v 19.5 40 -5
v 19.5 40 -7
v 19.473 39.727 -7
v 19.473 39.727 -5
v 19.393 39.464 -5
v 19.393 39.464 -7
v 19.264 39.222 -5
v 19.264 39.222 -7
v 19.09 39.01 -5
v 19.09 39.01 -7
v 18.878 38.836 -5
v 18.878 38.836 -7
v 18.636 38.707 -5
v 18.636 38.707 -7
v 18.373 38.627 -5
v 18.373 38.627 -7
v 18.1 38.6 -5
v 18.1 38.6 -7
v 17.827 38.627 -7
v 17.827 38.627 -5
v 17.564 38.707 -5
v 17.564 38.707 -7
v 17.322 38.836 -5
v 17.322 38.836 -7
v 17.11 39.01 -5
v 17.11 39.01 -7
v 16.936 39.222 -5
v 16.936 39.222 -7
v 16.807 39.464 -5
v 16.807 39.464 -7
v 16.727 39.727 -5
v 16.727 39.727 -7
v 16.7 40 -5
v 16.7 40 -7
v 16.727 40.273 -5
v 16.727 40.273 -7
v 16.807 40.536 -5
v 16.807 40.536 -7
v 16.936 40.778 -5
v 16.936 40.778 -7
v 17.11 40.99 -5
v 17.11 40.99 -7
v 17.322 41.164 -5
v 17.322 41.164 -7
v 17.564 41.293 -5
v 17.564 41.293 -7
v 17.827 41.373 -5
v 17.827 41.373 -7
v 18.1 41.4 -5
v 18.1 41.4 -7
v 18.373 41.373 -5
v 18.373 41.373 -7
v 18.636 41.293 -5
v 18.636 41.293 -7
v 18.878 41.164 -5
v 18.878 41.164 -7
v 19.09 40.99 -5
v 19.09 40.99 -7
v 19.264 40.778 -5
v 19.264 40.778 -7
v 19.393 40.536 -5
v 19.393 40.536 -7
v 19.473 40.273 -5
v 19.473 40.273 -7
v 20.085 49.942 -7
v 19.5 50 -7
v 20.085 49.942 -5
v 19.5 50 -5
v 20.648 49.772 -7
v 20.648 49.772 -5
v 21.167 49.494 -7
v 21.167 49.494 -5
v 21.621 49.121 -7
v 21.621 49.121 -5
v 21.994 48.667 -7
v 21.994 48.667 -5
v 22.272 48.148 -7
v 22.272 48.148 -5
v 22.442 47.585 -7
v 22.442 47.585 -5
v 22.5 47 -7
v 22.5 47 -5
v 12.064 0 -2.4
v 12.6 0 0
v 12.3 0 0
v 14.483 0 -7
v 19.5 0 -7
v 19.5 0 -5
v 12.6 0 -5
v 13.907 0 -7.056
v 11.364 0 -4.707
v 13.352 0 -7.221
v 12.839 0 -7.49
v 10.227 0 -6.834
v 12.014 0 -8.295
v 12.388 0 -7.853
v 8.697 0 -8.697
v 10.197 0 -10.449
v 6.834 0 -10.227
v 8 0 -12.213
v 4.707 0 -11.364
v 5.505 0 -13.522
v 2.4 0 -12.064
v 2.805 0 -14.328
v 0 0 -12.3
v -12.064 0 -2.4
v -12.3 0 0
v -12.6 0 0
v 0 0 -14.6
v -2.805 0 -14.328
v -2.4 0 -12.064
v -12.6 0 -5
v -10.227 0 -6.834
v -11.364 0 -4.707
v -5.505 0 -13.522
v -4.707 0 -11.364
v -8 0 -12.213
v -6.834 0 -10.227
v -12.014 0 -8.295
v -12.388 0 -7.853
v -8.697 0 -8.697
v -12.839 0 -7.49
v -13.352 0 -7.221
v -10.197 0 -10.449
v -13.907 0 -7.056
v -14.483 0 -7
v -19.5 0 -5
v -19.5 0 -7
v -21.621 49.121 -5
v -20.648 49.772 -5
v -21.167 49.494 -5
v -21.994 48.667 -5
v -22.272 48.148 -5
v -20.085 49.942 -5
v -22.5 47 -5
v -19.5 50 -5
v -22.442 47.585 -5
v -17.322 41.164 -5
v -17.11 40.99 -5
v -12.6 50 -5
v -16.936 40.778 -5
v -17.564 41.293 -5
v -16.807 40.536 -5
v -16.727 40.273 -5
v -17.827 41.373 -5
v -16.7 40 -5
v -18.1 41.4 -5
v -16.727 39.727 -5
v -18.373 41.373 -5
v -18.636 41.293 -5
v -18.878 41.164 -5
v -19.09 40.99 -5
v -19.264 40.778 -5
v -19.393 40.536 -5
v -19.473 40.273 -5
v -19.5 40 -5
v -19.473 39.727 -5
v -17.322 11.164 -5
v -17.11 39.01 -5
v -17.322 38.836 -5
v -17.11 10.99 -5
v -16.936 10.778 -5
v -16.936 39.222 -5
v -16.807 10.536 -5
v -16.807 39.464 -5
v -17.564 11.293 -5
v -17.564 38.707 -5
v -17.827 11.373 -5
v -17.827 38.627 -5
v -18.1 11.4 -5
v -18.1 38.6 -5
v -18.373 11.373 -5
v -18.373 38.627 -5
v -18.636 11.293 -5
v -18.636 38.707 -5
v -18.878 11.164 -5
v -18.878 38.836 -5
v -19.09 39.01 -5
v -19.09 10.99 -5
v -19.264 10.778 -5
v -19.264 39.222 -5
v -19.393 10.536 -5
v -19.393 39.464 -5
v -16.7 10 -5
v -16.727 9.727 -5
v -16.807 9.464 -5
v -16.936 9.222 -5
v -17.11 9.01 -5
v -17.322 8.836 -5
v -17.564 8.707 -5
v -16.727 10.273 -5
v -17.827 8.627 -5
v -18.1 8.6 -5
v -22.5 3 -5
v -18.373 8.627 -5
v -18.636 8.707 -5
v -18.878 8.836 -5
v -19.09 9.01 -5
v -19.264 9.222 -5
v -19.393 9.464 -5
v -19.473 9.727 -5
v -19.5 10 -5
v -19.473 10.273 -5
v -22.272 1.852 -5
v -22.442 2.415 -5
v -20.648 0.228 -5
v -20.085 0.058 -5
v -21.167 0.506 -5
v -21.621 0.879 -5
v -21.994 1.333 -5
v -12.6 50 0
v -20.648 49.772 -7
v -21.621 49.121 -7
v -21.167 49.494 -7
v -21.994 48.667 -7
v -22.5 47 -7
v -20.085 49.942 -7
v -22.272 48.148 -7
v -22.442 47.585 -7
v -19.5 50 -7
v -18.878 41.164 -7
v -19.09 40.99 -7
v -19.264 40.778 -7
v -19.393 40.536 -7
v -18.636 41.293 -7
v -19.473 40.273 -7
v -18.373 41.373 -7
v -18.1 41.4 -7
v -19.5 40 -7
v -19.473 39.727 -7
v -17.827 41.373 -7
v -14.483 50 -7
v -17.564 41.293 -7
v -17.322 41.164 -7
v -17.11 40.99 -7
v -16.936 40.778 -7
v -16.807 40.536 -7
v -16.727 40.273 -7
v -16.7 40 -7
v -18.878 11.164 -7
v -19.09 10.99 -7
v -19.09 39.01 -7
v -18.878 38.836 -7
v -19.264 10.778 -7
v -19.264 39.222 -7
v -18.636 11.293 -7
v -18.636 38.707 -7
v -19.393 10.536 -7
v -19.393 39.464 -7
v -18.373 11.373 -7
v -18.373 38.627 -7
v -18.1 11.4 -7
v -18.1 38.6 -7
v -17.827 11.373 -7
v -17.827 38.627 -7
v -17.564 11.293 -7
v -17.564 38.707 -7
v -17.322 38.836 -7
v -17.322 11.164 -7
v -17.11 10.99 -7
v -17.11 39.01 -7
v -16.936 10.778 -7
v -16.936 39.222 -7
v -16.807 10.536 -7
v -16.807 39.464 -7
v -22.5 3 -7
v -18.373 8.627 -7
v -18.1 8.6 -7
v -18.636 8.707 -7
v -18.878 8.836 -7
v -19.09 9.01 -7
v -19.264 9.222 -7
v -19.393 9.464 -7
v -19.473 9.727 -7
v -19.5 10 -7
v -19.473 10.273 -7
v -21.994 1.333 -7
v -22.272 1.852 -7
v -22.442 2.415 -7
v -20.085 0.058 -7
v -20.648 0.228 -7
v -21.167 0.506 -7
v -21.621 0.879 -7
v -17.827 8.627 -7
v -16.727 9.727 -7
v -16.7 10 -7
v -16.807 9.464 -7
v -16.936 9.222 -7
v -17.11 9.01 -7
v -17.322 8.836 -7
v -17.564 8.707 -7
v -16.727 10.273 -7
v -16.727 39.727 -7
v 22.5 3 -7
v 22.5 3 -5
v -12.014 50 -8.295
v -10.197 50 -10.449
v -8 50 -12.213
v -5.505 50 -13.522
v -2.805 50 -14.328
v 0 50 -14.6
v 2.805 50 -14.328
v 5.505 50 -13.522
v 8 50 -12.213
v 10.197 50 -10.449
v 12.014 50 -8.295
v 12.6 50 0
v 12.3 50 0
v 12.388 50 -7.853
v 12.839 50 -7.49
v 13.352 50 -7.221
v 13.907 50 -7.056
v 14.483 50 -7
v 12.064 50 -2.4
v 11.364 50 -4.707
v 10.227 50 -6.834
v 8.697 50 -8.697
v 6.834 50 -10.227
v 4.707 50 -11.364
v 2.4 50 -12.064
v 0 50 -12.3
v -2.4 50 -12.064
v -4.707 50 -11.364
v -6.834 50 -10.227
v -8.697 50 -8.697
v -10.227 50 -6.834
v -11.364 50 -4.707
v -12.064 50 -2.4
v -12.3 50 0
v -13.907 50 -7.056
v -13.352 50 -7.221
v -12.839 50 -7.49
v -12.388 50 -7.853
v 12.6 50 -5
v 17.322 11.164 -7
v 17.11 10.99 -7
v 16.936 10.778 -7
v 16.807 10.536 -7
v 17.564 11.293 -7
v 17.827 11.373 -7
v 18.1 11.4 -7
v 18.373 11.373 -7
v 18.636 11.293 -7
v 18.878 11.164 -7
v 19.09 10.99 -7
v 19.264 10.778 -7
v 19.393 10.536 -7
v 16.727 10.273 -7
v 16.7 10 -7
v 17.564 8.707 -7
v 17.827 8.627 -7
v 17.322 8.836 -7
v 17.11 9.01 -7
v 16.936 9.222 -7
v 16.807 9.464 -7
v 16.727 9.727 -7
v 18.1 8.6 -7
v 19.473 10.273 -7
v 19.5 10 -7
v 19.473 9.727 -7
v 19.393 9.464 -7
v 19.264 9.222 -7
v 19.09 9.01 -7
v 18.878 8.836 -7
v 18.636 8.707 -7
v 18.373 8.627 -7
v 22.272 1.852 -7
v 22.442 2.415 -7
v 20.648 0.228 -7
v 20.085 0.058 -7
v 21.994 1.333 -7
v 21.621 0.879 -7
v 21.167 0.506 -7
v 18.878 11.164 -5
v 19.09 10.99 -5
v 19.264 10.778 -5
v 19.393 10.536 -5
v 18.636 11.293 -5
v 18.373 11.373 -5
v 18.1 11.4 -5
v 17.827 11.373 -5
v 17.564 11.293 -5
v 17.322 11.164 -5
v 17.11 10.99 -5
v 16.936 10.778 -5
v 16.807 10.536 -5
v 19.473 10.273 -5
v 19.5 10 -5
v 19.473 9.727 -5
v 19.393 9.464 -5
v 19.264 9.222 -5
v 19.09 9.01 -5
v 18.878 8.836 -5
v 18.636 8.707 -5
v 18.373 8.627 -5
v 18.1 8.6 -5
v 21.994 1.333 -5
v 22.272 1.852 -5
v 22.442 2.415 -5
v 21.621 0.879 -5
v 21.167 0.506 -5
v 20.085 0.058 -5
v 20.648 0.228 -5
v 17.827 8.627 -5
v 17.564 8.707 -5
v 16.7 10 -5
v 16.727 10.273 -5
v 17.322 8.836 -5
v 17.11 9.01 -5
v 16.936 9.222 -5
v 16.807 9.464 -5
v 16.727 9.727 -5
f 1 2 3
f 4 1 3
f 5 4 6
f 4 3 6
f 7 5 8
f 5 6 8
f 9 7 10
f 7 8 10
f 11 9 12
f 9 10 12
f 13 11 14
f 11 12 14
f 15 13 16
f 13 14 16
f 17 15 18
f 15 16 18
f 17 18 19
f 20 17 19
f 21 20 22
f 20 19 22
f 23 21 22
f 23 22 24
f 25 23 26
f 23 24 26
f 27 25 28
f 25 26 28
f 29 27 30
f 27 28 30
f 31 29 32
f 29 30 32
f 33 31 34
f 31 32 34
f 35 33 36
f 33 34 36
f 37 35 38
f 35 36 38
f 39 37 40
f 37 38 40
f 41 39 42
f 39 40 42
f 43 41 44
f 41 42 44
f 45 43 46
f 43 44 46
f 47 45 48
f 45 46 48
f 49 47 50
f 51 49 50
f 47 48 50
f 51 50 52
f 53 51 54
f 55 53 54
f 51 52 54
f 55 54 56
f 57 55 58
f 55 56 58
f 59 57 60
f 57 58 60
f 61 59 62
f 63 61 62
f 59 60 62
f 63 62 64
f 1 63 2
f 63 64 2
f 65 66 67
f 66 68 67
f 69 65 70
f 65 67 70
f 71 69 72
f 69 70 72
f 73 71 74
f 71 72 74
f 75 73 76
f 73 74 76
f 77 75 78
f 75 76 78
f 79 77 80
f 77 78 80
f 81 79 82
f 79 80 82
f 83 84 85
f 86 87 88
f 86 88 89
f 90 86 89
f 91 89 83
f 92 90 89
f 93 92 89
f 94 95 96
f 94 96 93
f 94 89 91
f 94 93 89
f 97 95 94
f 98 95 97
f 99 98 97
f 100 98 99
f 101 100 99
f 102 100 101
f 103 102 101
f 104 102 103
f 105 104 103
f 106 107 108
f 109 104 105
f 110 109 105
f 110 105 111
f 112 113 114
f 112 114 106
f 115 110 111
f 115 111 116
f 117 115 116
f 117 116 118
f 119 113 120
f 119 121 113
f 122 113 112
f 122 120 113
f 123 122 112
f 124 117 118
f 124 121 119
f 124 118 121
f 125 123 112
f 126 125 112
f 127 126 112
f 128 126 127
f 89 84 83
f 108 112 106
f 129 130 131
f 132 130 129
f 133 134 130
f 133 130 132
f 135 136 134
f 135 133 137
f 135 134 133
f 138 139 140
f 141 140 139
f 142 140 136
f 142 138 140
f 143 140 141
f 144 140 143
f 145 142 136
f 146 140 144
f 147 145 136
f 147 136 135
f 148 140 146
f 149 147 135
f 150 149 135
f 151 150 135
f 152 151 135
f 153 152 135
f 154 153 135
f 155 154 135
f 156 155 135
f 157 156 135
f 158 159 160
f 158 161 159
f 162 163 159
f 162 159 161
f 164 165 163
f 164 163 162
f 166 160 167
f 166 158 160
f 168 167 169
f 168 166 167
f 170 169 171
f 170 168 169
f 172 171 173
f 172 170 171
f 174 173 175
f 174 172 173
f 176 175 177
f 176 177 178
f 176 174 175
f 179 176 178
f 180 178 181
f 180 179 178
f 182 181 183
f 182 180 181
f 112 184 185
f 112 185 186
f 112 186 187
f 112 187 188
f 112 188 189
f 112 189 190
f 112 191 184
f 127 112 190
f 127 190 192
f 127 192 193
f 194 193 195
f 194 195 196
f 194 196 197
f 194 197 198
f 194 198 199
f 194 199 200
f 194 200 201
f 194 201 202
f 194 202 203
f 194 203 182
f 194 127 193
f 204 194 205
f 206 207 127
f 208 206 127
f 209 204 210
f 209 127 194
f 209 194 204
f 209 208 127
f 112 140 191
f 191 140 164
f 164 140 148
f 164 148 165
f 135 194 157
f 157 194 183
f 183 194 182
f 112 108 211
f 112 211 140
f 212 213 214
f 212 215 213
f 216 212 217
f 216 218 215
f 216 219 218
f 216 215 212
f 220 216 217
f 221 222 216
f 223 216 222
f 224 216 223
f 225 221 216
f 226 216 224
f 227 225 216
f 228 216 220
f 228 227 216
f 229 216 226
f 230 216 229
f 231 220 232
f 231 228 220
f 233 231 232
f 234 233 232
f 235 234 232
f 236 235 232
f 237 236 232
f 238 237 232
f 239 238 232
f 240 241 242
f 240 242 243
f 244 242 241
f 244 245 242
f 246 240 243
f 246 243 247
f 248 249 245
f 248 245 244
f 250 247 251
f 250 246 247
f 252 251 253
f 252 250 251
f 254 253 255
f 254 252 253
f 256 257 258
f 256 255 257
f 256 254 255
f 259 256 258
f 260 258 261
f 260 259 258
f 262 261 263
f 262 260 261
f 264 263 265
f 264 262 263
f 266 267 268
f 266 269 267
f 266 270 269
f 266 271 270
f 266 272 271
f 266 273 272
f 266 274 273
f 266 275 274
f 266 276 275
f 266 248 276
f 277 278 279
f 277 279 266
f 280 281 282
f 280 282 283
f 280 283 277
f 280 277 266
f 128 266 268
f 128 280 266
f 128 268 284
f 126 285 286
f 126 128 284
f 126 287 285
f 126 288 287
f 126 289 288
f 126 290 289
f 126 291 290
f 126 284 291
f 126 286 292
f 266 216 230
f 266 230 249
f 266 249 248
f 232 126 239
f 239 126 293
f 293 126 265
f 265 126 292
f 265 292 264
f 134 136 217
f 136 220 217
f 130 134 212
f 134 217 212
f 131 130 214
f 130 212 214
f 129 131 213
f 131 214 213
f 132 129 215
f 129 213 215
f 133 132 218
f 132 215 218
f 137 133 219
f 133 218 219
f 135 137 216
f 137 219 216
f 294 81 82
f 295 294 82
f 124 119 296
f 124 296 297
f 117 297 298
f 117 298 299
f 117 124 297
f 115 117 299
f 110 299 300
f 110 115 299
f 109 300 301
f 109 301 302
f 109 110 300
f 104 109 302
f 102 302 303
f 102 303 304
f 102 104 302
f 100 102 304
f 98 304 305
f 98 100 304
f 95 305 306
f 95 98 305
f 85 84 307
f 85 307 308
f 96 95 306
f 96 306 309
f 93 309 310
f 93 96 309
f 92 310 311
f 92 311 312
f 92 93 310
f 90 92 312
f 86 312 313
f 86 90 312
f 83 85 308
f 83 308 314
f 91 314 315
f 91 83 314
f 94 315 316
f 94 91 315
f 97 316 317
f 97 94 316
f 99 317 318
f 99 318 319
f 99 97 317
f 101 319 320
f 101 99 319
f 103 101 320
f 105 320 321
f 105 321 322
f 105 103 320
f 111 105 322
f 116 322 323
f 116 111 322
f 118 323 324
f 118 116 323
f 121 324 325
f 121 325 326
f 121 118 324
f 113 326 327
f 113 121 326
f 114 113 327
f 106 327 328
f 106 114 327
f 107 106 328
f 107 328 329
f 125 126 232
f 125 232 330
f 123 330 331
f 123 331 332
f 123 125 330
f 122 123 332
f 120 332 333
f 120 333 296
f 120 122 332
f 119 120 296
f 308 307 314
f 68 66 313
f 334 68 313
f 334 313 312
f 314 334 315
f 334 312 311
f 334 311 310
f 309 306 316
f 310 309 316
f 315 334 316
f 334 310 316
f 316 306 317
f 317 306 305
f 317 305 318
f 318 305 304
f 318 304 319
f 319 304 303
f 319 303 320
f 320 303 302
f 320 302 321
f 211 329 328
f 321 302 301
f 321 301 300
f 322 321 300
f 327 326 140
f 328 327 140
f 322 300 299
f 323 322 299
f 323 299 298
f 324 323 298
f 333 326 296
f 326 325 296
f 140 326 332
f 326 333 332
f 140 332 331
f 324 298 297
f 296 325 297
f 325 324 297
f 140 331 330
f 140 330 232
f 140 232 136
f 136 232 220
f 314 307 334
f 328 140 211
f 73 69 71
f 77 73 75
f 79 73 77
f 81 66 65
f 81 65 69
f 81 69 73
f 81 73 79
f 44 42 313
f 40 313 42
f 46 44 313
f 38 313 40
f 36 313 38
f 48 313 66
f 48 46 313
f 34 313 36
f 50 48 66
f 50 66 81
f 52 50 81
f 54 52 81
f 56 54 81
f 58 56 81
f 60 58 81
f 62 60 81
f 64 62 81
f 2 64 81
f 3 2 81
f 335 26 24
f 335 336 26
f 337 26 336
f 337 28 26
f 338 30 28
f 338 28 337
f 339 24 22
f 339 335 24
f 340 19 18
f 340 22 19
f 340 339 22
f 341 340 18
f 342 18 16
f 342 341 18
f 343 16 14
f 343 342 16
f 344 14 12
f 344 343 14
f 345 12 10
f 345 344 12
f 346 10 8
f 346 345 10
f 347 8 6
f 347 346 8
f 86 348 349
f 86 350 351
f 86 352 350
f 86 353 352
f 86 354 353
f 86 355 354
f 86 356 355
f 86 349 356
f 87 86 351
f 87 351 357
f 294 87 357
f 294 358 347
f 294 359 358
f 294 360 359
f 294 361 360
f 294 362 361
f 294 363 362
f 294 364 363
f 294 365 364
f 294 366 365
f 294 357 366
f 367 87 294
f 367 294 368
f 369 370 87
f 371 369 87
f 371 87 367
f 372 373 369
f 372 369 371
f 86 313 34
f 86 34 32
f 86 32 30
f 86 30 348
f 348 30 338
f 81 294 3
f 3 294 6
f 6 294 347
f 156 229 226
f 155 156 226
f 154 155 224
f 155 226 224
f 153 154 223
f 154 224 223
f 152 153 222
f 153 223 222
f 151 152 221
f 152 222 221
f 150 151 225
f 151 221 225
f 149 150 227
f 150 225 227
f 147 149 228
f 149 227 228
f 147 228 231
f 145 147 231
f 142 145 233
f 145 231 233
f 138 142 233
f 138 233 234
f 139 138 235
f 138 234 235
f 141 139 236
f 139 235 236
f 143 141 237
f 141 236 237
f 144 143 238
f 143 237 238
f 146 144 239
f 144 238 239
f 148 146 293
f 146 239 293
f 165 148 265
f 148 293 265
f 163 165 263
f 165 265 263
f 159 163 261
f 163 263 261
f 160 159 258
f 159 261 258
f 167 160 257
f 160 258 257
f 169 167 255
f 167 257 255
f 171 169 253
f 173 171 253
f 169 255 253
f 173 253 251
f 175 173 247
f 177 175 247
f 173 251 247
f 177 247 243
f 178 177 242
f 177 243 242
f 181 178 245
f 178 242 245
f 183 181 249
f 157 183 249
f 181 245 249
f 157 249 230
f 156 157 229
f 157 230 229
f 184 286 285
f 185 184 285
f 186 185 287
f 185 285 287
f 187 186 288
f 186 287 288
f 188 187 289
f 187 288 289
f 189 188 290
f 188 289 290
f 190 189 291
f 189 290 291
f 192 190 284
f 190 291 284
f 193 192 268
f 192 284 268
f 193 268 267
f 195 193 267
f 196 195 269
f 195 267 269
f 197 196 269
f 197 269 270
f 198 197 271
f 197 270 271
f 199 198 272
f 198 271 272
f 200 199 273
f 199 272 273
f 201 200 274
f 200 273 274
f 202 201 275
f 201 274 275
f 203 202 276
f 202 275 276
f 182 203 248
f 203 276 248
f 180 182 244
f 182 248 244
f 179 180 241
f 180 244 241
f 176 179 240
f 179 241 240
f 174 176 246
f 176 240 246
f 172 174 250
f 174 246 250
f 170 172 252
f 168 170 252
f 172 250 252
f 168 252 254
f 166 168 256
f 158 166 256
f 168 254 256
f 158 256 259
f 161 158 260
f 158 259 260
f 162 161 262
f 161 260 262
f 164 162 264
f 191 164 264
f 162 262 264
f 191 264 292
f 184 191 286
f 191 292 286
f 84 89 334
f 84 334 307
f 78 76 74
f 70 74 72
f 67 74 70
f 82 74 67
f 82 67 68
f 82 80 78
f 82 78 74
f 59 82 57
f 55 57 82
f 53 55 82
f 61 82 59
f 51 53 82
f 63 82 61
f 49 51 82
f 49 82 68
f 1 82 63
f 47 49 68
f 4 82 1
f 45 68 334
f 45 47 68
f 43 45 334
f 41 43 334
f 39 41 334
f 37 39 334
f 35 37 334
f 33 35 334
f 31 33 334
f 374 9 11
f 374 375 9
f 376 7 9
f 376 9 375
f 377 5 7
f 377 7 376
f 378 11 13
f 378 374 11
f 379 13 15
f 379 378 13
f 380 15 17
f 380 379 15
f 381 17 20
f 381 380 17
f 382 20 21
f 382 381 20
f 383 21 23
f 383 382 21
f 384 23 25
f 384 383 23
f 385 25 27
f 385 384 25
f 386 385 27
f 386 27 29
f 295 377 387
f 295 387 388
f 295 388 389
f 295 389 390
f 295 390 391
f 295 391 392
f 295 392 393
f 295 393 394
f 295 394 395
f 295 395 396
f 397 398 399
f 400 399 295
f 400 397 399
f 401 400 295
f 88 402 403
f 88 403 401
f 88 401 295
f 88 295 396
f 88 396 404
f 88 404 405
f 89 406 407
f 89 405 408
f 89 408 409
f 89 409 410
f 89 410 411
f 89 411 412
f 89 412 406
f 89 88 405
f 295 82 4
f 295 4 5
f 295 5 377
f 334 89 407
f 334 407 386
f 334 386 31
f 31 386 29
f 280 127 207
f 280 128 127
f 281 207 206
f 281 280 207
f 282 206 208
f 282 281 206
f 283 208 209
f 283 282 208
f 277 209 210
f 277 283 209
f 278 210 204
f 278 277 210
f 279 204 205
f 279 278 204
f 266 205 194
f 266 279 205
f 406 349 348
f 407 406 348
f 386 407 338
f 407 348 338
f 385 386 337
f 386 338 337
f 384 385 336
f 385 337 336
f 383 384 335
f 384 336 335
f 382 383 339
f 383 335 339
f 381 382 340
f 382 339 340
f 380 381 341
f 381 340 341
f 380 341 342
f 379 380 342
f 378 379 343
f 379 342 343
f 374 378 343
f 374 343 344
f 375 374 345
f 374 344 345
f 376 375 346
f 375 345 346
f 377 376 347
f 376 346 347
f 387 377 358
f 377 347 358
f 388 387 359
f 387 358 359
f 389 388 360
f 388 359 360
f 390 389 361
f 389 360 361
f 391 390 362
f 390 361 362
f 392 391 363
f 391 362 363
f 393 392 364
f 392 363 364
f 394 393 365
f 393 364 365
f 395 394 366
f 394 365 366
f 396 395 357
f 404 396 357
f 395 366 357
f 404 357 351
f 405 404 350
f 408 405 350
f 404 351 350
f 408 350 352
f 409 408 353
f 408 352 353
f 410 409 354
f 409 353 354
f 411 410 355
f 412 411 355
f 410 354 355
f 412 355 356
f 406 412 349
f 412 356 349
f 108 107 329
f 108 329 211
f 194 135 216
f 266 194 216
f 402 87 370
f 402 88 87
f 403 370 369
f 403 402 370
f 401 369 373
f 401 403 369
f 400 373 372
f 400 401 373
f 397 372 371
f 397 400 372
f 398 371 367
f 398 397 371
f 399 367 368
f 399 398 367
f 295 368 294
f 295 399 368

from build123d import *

# Parameters (mm, degrees)
BOSS_EXTRUDE1_DEPTH = 50
SKETCH2_R           = 1.4
CUT_EXTRUDE3_DEPTH  = 2
FILLET2_R           = 3


with BuildPart() as part:
    # Sketch1 → Boss-Extrude1 (new body)
    with BuildSketch(Plane(origin=(0, 0, 0), x_dir=(1, 0, 0), z_dir=(0, 1, 0))):
        with BuildLine():
            Line((-12.6, 0), (-12.6, 5))
            Line((-12.6, 5), (-22.5, 5))
            Line((-22.5, 5), (-22.5, 7))
            Line((-22.5, 7), (-22.1, 7))
            Line((-22.1, 7), (-14.483093592, 7))
            ThreePointArc((-14.483093592, 7), (-13.089113026, 7.343532763), (-12.014384457, 8.295454545))
            ThreePointArc((-12.014384457, 8.295454545), (0, 14.6), (12.014384457, 8.295454545))
            ThreePointArc((12.014384457, 8.295454545), (13.089113026, 7.343532763), (14.483093592, 7))
            Line((14.483093592, 7), (22.1, 7))
            Line((22.1, 7), (22.5, 7))
            Line((22.5, 7), (22.5, 5))
            Line((22.5, 5), (12.6, 5))
            Line((12.6, 5), (12.6, 0))
            Line((12.6, 0), (12.3, 0))
            ThreePointArc((12.3, 0), (0, 12.3), (-12.3, 0))
            Line((-12.3, 0), (-12.6, 0))
        make_face()
    extrude(amount=BOSS_EXTRUDE1_DEPTH)

    # Sketch2 → Cut-Extrude3 (cut)
    with BuildSketch(Plane(origin=(0, 0, -7), x_dir=(-1, 0, 0), z_dir=(0, 0, -1))):
        with Locations((-18.1, 10)):
            Circle(SKETCH2_R)
        with Locations(Location((-18.1, 40, 0), (0, 0, 180))):
            Circle(SKETCH2_R)
        with Locations((18.1, 40)):
            Circle(SKETCH2_R)
        with Locations(Location((18.1, 10, 0), (0, 0, 180))):
            Circle(SKETCH2_R)
    extrude(amount=-CUT_EXTRUDE3_DEPTH, mode=Mode.SUBTRACT)

    # Fillet2
    fillet2_edges = [part.edges().sort_by_distance(p)[0] for p in [
        (-22.5, 0, -6),
        (22.5, 0, -6),
        (22.5, 50, -6),
        (-22.5, 50, -6),
    ]]
    fillet(fillet2_edges, radius=FILLET2_R)


solid = part.part
